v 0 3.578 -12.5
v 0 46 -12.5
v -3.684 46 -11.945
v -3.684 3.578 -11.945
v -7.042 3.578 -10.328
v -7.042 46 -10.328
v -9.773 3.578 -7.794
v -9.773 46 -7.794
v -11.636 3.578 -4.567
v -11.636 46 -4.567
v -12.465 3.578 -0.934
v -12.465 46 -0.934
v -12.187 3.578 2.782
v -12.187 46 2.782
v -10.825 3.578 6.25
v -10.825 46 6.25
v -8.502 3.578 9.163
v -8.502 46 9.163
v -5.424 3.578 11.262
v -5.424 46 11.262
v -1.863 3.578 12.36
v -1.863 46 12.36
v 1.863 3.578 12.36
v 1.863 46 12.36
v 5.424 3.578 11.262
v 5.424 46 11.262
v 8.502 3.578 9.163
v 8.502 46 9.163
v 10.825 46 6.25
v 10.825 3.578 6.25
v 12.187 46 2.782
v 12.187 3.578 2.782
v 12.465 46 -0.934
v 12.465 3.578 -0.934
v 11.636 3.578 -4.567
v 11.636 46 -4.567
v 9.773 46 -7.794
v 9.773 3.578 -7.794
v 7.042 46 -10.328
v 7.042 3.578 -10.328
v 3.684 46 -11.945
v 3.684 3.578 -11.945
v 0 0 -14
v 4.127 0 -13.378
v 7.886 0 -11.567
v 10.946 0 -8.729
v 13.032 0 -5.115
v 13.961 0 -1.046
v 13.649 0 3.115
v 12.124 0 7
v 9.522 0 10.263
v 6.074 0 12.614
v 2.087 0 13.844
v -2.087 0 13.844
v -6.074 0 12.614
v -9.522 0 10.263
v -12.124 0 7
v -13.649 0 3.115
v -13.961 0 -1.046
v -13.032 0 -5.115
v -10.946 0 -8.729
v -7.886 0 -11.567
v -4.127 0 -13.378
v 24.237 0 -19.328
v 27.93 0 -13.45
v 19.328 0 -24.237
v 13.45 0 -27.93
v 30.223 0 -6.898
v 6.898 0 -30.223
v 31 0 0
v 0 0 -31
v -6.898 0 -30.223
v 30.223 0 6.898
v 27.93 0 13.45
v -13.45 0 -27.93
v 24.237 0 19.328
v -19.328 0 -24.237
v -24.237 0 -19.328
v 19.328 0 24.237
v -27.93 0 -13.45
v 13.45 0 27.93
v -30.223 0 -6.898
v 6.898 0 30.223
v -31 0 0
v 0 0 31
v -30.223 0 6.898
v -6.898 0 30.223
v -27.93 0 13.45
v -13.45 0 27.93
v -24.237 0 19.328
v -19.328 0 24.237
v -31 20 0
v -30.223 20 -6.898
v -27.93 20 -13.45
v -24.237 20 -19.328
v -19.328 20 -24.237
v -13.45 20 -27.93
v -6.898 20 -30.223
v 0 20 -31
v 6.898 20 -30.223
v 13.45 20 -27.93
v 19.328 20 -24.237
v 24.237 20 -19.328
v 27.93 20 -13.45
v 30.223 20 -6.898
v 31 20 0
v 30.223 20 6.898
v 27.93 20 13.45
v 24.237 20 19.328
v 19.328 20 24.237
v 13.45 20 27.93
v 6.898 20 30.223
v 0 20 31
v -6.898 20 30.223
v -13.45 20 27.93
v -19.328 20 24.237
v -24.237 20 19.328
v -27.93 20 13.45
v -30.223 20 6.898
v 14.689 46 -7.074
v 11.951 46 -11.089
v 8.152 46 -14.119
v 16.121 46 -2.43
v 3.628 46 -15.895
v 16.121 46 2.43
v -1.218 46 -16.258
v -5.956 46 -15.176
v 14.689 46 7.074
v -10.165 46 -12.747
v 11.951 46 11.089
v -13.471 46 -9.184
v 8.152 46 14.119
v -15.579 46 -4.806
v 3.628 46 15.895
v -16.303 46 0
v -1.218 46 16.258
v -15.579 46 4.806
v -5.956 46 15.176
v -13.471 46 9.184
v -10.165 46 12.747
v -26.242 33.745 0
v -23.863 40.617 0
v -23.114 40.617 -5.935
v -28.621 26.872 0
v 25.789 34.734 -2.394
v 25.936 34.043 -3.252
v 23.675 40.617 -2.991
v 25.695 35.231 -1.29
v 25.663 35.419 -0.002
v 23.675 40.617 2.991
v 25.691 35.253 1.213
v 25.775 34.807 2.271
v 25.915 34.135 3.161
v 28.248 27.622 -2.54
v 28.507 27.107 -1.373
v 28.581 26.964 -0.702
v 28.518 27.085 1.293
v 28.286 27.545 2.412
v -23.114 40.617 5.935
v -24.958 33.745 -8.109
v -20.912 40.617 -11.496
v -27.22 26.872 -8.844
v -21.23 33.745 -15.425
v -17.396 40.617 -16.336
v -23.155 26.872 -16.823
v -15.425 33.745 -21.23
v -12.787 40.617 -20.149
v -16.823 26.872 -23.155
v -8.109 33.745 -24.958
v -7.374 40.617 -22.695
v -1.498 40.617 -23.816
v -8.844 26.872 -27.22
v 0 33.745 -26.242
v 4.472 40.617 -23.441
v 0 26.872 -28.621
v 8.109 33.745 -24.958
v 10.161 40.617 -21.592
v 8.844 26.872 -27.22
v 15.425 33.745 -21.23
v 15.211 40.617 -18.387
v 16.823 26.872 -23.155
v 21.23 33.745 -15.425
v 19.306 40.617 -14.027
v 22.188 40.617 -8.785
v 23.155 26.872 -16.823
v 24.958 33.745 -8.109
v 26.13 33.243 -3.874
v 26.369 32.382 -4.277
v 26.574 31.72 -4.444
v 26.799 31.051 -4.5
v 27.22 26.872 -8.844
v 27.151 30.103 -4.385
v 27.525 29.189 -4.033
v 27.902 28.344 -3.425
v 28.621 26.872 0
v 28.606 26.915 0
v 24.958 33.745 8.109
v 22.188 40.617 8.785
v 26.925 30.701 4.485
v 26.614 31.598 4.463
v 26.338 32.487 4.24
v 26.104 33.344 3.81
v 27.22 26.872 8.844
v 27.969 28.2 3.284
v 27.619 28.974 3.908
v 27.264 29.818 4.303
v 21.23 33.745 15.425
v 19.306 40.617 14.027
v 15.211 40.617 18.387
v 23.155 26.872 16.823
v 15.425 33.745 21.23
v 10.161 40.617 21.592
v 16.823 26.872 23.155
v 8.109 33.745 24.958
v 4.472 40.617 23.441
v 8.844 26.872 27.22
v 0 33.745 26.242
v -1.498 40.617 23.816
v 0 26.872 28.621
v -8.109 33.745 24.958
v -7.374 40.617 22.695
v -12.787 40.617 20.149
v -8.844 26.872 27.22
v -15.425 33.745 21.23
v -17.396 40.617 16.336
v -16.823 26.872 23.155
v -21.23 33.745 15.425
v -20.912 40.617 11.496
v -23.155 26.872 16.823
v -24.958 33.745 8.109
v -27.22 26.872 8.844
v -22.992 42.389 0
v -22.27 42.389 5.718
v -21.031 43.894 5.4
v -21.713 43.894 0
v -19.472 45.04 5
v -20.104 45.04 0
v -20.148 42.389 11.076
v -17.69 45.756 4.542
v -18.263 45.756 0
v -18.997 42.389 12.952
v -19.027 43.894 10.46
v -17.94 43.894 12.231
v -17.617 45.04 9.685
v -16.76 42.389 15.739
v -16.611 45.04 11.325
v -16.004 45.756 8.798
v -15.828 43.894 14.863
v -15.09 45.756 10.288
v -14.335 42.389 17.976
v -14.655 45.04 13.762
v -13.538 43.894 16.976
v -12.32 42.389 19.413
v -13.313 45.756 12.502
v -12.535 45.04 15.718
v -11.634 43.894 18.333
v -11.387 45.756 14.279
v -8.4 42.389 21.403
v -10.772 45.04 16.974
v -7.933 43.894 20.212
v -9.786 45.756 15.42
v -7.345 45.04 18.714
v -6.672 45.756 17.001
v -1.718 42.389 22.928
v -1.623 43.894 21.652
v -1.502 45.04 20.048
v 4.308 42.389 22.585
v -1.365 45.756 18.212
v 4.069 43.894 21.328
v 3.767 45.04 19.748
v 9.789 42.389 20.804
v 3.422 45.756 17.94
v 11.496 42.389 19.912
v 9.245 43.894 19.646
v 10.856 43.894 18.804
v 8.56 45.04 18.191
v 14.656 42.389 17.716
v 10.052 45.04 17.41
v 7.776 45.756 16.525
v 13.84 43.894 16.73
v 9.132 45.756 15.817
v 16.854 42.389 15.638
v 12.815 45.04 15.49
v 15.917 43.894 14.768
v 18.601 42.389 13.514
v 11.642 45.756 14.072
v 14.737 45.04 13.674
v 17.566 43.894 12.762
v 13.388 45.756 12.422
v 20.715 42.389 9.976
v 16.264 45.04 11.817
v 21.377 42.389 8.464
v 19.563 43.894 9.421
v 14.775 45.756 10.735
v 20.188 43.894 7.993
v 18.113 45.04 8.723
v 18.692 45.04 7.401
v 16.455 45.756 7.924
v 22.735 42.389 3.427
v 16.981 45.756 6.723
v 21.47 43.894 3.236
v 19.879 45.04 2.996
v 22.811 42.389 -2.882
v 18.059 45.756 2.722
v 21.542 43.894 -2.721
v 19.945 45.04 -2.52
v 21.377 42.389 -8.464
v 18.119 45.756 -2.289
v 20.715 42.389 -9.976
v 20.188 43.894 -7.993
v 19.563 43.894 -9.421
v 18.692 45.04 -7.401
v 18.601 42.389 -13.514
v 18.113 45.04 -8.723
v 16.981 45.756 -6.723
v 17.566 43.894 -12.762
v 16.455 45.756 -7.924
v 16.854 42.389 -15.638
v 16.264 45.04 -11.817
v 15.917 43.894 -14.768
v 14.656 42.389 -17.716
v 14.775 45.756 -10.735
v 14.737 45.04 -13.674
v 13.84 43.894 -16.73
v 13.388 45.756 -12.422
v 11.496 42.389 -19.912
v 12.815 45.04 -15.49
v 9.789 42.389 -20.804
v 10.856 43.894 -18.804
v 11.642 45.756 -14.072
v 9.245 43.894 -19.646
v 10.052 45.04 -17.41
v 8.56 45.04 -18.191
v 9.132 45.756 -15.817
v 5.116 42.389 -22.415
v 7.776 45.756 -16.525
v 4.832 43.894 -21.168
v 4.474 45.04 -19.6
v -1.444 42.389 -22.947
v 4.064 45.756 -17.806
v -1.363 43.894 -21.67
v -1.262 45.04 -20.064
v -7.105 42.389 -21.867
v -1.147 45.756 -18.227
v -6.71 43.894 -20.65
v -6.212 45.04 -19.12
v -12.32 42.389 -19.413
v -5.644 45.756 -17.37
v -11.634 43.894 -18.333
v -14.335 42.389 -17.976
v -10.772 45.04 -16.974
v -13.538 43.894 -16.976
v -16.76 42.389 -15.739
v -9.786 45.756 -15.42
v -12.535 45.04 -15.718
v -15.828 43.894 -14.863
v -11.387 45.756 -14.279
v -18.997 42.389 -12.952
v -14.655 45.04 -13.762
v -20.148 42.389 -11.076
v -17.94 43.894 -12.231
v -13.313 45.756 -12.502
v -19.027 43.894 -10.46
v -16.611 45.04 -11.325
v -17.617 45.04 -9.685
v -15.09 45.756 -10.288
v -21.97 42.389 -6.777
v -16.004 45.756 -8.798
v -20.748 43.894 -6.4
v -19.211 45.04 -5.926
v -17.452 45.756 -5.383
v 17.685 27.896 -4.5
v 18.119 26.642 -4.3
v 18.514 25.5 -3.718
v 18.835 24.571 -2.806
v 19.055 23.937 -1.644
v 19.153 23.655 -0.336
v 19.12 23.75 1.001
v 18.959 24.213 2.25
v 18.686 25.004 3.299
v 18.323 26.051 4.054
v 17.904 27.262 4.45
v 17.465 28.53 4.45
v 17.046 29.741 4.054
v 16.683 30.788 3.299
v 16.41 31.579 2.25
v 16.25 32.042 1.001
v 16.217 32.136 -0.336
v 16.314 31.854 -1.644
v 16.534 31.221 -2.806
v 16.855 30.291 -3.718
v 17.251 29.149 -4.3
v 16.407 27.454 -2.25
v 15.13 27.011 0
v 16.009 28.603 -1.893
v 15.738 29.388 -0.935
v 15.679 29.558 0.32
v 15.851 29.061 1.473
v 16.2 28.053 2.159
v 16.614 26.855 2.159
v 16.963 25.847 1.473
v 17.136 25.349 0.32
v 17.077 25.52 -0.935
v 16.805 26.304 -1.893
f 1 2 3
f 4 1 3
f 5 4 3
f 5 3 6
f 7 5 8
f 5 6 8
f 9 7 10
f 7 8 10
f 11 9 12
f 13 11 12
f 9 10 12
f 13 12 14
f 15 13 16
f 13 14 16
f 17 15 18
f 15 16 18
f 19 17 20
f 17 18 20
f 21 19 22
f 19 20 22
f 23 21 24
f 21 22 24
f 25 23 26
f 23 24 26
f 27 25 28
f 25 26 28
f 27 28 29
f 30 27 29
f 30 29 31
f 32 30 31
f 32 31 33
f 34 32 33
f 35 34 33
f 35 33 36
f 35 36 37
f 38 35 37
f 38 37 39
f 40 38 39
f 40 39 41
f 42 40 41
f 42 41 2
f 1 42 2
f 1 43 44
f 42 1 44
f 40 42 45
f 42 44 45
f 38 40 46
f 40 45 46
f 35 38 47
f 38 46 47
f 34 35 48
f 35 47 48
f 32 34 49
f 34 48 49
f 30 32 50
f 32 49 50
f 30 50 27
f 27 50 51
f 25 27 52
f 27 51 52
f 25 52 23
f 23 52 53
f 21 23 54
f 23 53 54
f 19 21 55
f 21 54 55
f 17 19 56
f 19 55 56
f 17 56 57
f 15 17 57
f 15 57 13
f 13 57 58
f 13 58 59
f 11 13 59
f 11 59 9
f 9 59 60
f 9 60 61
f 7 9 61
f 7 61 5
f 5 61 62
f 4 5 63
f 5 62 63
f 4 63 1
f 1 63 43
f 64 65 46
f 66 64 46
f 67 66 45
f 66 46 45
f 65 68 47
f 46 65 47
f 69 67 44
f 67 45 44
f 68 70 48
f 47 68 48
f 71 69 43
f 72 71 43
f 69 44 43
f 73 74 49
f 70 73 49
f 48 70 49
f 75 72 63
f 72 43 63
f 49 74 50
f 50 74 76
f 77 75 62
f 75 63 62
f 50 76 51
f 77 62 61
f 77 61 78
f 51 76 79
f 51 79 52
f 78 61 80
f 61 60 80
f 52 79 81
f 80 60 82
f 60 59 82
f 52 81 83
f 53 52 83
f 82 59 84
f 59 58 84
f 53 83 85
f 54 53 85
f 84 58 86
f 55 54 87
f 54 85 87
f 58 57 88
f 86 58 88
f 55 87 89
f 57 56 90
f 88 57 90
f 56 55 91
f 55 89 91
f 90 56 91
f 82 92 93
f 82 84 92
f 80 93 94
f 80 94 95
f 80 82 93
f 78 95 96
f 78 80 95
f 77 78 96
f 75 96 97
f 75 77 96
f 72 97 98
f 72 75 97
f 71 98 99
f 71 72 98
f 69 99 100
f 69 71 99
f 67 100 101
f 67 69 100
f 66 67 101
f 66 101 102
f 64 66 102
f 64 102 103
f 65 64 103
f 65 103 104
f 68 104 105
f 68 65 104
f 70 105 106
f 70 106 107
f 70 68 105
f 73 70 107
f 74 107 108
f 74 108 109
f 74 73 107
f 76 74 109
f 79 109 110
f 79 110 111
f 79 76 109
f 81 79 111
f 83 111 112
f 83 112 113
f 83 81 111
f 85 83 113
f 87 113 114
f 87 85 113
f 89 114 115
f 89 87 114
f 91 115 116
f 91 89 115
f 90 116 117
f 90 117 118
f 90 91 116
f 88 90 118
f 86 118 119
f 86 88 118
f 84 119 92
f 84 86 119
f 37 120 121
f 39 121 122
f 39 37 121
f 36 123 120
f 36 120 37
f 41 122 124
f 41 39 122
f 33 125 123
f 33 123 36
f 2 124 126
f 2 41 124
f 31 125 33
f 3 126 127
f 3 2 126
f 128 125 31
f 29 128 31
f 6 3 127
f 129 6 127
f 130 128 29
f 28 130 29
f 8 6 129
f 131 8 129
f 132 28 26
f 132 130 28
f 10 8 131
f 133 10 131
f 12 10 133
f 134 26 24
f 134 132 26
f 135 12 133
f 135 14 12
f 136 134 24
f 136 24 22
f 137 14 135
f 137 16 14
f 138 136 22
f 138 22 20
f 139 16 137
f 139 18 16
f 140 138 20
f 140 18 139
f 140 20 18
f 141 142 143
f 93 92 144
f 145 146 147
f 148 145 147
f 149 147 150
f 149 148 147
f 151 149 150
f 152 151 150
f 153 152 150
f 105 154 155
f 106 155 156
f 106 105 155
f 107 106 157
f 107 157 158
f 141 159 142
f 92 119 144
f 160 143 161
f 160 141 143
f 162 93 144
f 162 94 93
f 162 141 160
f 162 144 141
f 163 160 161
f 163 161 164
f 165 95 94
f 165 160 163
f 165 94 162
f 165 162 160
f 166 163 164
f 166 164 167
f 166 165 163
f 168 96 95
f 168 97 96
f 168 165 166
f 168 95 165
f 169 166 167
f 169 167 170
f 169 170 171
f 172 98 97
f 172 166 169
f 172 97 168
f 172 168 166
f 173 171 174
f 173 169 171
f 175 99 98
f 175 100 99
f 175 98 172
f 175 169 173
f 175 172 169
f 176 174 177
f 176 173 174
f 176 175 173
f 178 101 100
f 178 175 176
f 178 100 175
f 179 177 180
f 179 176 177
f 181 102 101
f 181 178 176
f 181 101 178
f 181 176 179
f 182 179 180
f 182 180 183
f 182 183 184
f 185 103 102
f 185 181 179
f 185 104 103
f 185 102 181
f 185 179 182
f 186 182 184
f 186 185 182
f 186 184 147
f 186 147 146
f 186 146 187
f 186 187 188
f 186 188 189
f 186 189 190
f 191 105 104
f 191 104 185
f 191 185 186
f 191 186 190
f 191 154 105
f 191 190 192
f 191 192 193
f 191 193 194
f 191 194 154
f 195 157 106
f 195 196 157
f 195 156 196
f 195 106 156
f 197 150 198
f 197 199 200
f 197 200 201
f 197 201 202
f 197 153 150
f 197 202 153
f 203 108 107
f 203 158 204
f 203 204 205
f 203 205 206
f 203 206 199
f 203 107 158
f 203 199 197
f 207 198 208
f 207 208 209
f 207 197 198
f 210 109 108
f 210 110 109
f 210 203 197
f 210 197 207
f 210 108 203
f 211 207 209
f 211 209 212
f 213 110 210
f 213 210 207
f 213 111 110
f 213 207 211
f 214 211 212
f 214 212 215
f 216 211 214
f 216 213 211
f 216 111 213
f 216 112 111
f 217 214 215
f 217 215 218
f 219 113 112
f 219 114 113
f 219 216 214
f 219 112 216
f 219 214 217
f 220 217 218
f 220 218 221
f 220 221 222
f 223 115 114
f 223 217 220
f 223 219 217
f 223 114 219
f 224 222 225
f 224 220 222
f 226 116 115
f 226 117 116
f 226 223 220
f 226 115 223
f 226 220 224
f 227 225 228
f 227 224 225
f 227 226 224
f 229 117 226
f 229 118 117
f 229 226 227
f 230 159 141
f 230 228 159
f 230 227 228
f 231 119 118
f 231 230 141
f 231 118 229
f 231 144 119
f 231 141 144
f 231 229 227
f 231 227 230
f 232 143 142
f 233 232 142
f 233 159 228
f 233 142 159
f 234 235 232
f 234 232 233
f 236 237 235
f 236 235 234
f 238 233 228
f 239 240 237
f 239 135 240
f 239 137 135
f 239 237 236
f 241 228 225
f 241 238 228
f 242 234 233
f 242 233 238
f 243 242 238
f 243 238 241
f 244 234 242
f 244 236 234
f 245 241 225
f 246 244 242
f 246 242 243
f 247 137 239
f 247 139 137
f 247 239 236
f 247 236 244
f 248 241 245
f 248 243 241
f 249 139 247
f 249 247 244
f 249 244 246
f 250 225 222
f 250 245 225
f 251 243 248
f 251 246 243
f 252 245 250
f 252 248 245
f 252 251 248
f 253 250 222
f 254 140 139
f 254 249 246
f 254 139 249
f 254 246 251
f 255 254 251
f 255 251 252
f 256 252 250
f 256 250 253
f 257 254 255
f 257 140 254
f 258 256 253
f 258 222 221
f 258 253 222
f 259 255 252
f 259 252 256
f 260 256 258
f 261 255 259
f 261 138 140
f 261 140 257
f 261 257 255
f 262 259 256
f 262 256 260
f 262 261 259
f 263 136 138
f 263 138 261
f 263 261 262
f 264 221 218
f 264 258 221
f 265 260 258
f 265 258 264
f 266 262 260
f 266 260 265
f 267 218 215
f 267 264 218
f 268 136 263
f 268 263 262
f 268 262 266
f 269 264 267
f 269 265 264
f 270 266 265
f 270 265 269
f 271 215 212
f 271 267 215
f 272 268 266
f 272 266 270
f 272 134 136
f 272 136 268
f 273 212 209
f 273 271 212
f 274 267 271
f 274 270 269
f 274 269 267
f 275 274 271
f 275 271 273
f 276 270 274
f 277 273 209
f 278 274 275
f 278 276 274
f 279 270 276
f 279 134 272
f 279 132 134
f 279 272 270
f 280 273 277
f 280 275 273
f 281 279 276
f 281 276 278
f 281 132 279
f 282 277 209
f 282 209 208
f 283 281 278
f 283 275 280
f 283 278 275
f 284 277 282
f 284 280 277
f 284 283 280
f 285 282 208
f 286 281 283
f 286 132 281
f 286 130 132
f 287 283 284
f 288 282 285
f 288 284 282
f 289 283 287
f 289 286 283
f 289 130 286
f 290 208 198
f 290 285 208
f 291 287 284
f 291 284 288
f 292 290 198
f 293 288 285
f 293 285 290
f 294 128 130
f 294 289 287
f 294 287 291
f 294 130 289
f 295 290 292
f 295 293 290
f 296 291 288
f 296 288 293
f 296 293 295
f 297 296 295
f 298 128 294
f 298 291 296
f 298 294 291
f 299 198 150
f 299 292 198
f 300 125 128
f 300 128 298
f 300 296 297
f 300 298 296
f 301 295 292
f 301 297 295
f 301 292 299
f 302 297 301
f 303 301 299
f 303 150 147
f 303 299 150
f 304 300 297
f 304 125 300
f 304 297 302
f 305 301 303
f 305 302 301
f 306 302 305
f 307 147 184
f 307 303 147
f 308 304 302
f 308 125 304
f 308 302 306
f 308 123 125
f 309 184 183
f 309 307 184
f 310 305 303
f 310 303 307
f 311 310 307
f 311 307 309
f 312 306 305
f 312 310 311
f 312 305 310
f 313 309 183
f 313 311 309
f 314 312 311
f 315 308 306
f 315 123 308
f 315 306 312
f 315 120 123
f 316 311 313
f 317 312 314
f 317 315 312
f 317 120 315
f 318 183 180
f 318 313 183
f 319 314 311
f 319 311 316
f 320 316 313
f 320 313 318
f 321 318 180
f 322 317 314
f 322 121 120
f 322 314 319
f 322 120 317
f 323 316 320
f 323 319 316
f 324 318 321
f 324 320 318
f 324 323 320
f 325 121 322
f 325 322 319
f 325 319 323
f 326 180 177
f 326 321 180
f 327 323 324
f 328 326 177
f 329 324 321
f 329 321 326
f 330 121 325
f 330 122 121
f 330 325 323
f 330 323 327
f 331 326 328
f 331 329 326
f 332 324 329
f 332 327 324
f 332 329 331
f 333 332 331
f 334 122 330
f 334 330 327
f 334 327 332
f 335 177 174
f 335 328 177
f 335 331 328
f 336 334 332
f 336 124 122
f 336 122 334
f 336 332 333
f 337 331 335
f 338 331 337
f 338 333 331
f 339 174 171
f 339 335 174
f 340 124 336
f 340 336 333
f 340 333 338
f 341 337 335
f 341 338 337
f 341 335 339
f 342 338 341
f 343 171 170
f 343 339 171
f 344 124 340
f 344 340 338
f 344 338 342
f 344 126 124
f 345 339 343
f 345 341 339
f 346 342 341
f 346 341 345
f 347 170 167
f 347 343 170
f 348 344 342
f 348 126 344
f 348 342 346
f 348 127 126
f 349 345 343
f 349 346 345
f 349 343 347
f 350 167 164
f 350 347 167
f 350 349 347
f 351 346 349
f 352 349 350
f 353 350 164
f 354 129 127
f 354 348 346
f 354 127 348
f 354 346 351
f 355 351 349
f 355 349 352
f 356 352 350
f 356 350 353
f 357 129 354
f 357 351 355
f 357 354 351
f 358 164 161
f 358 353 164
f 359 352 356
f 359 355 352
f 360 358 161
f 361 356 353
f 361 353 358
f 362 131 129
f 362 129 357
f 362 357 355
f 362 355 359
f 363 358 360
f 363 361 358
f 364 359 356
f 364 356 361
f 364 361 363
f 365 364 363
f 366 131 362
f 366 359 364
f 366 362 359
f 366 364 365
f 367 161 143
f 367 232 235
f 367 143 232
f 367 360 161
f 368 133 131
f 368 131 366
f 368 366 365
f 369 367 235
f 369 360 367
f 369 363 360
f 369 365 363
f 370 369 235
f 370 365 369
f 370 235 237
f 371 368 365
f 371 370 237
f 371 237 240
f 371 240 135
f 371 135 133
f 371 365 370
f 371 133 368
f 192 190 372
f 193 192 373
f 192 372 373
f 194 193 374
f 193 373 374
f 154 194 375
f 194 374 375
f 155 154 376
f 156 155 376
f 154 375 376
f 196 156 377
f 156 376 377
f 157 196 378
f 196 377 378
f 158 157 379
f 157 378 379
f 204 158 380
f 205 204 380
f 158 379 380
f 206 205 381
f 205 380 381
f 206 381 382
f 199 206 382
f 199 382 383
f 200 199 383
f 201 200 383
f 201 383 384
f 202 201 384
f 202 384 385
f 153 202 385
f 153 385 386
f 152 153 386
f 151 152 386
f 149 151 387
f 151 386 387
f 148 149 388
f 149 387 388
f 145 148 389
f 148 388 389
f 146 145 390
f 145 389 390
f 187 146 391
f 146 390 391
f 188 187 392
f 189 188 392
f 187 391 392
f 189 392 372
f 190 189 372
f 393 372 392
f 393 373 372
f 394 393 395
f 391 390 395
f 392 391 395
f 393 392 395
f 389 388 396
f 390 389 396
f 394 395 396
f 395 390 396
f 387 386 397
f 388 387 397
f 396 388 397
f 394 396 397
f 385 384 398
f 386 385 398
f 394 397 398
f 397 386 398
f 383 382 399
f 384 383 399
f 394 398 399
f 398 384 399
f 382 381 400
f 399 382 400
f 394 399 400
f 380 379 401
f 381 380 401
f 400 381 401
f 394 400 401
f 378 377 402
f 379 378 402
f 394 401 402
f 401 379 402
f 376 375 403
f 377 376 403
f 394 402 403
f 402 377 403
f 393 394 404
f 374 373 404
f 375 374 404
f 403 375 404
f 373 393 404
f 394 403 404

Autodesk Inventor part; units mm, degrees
sketch "Sketch1" plane through (0, 0, 0) normal (0, 1, 0) x (-1, 0, 0)
  circle A0 centre (0, 0) radius 31
  dimension "d0" = 62
extrude "Extrusion1" add sketch "Sketch1" along normal blind 20
sketch "Sketch2" plane through (0, 20, 0) normal (0, 1, 0) x (1, 0, 0)
  line L0 (0, 0) -> (31.1009, 0)
  circle A0 centre (0, 0) radius 31 projected
ref_plane "Work Plane1" through (0, 46, 0) normal (0, 1, 0) x (-1, 0, 0)
ref_plane "Work Plane2" through (31, 0, 0) normal (1, 0, 0) x (0, 1, 0)
sketch "Sketch3" plane through (0, 46, 0) normal (0, 1, 0) x (-1, 0, 0)
  circle A0 centre (0, 0) radius 31 construction
  line L0 (0, 0) -> (-22, 0)
  circle A1 centre (0, 0) radius 22
  dimension "d5" = 22
loft "Loft1" add profiles "Sketch3" section 1 edges at (31, 20, 0)
fillet "Fillet1" radius 8 1 edges at (22, 46, 0)
sketch "Sketch5" plane through (31, 0, 0) normal (1, 0, 0) x (0, 1, 0)
  line L0 (40.6169, -23.8634) -> (40.6169, 23.8634) projected
  line L1 (20, -31) -> (20, 31) projected
  point P0 (0, 0)
ref_plane "Work Plane3" through (31, 20, -31) normal (-0.9449861, -0.3271106, 0) x (0.3271106, -0.9449861, 0)
sketch "Sketch6" plane through (31, 20, -31) normal (-0.9449861, -0.3271106, 0) x (0.3271106, -0.9449861, 0)
  ellipse E0 centre (-29.6231, 31) end of major axis (-29.6231, 54.8634) minor radius 7.806 construction
  line L0 (34.5454, 31) -> (-68.4133, 31) construction
  point P0 (8.7593, 31)
  point P1 (-11.8171, 31)
  point P2 (-21.8171, 31)
  dimension "d11" = 10
hole "Hole1" at (27.1345, 31.167, 0) direction (-0.9449861, -0.3271106, 0) diameter 9 depth 10 tip angle 118
thread "Thread1" size "M10x1" class "6H" standard "ANSI Metric M Profile" length 56
sketch "Sketch7" plane through (0, 46, 0) normal (0, 1, 0) x (1, 0, 0)
  circle A0 centre (0, 0) radius 12.5
  dimension "d21" = 25
sketch "Sketch8" plane through (0, 0, 0) normal (0, -1, 0) x (1, 0, 0)
  circle A0 centre (0, 0) radius 12.5
  dimension "d22" = 25
hole "Hole2" at (0, 0, 0) direction (0, 1, 0) diameter 25 end through all countersink diameter 28 countersink angle 45.49
thread "Thread2" size "M25x1.5" class "6H" standard "ANSI Metric M Profile" length 56
properties part number "ClampingNut" material "Polycarbonate, Clear"
